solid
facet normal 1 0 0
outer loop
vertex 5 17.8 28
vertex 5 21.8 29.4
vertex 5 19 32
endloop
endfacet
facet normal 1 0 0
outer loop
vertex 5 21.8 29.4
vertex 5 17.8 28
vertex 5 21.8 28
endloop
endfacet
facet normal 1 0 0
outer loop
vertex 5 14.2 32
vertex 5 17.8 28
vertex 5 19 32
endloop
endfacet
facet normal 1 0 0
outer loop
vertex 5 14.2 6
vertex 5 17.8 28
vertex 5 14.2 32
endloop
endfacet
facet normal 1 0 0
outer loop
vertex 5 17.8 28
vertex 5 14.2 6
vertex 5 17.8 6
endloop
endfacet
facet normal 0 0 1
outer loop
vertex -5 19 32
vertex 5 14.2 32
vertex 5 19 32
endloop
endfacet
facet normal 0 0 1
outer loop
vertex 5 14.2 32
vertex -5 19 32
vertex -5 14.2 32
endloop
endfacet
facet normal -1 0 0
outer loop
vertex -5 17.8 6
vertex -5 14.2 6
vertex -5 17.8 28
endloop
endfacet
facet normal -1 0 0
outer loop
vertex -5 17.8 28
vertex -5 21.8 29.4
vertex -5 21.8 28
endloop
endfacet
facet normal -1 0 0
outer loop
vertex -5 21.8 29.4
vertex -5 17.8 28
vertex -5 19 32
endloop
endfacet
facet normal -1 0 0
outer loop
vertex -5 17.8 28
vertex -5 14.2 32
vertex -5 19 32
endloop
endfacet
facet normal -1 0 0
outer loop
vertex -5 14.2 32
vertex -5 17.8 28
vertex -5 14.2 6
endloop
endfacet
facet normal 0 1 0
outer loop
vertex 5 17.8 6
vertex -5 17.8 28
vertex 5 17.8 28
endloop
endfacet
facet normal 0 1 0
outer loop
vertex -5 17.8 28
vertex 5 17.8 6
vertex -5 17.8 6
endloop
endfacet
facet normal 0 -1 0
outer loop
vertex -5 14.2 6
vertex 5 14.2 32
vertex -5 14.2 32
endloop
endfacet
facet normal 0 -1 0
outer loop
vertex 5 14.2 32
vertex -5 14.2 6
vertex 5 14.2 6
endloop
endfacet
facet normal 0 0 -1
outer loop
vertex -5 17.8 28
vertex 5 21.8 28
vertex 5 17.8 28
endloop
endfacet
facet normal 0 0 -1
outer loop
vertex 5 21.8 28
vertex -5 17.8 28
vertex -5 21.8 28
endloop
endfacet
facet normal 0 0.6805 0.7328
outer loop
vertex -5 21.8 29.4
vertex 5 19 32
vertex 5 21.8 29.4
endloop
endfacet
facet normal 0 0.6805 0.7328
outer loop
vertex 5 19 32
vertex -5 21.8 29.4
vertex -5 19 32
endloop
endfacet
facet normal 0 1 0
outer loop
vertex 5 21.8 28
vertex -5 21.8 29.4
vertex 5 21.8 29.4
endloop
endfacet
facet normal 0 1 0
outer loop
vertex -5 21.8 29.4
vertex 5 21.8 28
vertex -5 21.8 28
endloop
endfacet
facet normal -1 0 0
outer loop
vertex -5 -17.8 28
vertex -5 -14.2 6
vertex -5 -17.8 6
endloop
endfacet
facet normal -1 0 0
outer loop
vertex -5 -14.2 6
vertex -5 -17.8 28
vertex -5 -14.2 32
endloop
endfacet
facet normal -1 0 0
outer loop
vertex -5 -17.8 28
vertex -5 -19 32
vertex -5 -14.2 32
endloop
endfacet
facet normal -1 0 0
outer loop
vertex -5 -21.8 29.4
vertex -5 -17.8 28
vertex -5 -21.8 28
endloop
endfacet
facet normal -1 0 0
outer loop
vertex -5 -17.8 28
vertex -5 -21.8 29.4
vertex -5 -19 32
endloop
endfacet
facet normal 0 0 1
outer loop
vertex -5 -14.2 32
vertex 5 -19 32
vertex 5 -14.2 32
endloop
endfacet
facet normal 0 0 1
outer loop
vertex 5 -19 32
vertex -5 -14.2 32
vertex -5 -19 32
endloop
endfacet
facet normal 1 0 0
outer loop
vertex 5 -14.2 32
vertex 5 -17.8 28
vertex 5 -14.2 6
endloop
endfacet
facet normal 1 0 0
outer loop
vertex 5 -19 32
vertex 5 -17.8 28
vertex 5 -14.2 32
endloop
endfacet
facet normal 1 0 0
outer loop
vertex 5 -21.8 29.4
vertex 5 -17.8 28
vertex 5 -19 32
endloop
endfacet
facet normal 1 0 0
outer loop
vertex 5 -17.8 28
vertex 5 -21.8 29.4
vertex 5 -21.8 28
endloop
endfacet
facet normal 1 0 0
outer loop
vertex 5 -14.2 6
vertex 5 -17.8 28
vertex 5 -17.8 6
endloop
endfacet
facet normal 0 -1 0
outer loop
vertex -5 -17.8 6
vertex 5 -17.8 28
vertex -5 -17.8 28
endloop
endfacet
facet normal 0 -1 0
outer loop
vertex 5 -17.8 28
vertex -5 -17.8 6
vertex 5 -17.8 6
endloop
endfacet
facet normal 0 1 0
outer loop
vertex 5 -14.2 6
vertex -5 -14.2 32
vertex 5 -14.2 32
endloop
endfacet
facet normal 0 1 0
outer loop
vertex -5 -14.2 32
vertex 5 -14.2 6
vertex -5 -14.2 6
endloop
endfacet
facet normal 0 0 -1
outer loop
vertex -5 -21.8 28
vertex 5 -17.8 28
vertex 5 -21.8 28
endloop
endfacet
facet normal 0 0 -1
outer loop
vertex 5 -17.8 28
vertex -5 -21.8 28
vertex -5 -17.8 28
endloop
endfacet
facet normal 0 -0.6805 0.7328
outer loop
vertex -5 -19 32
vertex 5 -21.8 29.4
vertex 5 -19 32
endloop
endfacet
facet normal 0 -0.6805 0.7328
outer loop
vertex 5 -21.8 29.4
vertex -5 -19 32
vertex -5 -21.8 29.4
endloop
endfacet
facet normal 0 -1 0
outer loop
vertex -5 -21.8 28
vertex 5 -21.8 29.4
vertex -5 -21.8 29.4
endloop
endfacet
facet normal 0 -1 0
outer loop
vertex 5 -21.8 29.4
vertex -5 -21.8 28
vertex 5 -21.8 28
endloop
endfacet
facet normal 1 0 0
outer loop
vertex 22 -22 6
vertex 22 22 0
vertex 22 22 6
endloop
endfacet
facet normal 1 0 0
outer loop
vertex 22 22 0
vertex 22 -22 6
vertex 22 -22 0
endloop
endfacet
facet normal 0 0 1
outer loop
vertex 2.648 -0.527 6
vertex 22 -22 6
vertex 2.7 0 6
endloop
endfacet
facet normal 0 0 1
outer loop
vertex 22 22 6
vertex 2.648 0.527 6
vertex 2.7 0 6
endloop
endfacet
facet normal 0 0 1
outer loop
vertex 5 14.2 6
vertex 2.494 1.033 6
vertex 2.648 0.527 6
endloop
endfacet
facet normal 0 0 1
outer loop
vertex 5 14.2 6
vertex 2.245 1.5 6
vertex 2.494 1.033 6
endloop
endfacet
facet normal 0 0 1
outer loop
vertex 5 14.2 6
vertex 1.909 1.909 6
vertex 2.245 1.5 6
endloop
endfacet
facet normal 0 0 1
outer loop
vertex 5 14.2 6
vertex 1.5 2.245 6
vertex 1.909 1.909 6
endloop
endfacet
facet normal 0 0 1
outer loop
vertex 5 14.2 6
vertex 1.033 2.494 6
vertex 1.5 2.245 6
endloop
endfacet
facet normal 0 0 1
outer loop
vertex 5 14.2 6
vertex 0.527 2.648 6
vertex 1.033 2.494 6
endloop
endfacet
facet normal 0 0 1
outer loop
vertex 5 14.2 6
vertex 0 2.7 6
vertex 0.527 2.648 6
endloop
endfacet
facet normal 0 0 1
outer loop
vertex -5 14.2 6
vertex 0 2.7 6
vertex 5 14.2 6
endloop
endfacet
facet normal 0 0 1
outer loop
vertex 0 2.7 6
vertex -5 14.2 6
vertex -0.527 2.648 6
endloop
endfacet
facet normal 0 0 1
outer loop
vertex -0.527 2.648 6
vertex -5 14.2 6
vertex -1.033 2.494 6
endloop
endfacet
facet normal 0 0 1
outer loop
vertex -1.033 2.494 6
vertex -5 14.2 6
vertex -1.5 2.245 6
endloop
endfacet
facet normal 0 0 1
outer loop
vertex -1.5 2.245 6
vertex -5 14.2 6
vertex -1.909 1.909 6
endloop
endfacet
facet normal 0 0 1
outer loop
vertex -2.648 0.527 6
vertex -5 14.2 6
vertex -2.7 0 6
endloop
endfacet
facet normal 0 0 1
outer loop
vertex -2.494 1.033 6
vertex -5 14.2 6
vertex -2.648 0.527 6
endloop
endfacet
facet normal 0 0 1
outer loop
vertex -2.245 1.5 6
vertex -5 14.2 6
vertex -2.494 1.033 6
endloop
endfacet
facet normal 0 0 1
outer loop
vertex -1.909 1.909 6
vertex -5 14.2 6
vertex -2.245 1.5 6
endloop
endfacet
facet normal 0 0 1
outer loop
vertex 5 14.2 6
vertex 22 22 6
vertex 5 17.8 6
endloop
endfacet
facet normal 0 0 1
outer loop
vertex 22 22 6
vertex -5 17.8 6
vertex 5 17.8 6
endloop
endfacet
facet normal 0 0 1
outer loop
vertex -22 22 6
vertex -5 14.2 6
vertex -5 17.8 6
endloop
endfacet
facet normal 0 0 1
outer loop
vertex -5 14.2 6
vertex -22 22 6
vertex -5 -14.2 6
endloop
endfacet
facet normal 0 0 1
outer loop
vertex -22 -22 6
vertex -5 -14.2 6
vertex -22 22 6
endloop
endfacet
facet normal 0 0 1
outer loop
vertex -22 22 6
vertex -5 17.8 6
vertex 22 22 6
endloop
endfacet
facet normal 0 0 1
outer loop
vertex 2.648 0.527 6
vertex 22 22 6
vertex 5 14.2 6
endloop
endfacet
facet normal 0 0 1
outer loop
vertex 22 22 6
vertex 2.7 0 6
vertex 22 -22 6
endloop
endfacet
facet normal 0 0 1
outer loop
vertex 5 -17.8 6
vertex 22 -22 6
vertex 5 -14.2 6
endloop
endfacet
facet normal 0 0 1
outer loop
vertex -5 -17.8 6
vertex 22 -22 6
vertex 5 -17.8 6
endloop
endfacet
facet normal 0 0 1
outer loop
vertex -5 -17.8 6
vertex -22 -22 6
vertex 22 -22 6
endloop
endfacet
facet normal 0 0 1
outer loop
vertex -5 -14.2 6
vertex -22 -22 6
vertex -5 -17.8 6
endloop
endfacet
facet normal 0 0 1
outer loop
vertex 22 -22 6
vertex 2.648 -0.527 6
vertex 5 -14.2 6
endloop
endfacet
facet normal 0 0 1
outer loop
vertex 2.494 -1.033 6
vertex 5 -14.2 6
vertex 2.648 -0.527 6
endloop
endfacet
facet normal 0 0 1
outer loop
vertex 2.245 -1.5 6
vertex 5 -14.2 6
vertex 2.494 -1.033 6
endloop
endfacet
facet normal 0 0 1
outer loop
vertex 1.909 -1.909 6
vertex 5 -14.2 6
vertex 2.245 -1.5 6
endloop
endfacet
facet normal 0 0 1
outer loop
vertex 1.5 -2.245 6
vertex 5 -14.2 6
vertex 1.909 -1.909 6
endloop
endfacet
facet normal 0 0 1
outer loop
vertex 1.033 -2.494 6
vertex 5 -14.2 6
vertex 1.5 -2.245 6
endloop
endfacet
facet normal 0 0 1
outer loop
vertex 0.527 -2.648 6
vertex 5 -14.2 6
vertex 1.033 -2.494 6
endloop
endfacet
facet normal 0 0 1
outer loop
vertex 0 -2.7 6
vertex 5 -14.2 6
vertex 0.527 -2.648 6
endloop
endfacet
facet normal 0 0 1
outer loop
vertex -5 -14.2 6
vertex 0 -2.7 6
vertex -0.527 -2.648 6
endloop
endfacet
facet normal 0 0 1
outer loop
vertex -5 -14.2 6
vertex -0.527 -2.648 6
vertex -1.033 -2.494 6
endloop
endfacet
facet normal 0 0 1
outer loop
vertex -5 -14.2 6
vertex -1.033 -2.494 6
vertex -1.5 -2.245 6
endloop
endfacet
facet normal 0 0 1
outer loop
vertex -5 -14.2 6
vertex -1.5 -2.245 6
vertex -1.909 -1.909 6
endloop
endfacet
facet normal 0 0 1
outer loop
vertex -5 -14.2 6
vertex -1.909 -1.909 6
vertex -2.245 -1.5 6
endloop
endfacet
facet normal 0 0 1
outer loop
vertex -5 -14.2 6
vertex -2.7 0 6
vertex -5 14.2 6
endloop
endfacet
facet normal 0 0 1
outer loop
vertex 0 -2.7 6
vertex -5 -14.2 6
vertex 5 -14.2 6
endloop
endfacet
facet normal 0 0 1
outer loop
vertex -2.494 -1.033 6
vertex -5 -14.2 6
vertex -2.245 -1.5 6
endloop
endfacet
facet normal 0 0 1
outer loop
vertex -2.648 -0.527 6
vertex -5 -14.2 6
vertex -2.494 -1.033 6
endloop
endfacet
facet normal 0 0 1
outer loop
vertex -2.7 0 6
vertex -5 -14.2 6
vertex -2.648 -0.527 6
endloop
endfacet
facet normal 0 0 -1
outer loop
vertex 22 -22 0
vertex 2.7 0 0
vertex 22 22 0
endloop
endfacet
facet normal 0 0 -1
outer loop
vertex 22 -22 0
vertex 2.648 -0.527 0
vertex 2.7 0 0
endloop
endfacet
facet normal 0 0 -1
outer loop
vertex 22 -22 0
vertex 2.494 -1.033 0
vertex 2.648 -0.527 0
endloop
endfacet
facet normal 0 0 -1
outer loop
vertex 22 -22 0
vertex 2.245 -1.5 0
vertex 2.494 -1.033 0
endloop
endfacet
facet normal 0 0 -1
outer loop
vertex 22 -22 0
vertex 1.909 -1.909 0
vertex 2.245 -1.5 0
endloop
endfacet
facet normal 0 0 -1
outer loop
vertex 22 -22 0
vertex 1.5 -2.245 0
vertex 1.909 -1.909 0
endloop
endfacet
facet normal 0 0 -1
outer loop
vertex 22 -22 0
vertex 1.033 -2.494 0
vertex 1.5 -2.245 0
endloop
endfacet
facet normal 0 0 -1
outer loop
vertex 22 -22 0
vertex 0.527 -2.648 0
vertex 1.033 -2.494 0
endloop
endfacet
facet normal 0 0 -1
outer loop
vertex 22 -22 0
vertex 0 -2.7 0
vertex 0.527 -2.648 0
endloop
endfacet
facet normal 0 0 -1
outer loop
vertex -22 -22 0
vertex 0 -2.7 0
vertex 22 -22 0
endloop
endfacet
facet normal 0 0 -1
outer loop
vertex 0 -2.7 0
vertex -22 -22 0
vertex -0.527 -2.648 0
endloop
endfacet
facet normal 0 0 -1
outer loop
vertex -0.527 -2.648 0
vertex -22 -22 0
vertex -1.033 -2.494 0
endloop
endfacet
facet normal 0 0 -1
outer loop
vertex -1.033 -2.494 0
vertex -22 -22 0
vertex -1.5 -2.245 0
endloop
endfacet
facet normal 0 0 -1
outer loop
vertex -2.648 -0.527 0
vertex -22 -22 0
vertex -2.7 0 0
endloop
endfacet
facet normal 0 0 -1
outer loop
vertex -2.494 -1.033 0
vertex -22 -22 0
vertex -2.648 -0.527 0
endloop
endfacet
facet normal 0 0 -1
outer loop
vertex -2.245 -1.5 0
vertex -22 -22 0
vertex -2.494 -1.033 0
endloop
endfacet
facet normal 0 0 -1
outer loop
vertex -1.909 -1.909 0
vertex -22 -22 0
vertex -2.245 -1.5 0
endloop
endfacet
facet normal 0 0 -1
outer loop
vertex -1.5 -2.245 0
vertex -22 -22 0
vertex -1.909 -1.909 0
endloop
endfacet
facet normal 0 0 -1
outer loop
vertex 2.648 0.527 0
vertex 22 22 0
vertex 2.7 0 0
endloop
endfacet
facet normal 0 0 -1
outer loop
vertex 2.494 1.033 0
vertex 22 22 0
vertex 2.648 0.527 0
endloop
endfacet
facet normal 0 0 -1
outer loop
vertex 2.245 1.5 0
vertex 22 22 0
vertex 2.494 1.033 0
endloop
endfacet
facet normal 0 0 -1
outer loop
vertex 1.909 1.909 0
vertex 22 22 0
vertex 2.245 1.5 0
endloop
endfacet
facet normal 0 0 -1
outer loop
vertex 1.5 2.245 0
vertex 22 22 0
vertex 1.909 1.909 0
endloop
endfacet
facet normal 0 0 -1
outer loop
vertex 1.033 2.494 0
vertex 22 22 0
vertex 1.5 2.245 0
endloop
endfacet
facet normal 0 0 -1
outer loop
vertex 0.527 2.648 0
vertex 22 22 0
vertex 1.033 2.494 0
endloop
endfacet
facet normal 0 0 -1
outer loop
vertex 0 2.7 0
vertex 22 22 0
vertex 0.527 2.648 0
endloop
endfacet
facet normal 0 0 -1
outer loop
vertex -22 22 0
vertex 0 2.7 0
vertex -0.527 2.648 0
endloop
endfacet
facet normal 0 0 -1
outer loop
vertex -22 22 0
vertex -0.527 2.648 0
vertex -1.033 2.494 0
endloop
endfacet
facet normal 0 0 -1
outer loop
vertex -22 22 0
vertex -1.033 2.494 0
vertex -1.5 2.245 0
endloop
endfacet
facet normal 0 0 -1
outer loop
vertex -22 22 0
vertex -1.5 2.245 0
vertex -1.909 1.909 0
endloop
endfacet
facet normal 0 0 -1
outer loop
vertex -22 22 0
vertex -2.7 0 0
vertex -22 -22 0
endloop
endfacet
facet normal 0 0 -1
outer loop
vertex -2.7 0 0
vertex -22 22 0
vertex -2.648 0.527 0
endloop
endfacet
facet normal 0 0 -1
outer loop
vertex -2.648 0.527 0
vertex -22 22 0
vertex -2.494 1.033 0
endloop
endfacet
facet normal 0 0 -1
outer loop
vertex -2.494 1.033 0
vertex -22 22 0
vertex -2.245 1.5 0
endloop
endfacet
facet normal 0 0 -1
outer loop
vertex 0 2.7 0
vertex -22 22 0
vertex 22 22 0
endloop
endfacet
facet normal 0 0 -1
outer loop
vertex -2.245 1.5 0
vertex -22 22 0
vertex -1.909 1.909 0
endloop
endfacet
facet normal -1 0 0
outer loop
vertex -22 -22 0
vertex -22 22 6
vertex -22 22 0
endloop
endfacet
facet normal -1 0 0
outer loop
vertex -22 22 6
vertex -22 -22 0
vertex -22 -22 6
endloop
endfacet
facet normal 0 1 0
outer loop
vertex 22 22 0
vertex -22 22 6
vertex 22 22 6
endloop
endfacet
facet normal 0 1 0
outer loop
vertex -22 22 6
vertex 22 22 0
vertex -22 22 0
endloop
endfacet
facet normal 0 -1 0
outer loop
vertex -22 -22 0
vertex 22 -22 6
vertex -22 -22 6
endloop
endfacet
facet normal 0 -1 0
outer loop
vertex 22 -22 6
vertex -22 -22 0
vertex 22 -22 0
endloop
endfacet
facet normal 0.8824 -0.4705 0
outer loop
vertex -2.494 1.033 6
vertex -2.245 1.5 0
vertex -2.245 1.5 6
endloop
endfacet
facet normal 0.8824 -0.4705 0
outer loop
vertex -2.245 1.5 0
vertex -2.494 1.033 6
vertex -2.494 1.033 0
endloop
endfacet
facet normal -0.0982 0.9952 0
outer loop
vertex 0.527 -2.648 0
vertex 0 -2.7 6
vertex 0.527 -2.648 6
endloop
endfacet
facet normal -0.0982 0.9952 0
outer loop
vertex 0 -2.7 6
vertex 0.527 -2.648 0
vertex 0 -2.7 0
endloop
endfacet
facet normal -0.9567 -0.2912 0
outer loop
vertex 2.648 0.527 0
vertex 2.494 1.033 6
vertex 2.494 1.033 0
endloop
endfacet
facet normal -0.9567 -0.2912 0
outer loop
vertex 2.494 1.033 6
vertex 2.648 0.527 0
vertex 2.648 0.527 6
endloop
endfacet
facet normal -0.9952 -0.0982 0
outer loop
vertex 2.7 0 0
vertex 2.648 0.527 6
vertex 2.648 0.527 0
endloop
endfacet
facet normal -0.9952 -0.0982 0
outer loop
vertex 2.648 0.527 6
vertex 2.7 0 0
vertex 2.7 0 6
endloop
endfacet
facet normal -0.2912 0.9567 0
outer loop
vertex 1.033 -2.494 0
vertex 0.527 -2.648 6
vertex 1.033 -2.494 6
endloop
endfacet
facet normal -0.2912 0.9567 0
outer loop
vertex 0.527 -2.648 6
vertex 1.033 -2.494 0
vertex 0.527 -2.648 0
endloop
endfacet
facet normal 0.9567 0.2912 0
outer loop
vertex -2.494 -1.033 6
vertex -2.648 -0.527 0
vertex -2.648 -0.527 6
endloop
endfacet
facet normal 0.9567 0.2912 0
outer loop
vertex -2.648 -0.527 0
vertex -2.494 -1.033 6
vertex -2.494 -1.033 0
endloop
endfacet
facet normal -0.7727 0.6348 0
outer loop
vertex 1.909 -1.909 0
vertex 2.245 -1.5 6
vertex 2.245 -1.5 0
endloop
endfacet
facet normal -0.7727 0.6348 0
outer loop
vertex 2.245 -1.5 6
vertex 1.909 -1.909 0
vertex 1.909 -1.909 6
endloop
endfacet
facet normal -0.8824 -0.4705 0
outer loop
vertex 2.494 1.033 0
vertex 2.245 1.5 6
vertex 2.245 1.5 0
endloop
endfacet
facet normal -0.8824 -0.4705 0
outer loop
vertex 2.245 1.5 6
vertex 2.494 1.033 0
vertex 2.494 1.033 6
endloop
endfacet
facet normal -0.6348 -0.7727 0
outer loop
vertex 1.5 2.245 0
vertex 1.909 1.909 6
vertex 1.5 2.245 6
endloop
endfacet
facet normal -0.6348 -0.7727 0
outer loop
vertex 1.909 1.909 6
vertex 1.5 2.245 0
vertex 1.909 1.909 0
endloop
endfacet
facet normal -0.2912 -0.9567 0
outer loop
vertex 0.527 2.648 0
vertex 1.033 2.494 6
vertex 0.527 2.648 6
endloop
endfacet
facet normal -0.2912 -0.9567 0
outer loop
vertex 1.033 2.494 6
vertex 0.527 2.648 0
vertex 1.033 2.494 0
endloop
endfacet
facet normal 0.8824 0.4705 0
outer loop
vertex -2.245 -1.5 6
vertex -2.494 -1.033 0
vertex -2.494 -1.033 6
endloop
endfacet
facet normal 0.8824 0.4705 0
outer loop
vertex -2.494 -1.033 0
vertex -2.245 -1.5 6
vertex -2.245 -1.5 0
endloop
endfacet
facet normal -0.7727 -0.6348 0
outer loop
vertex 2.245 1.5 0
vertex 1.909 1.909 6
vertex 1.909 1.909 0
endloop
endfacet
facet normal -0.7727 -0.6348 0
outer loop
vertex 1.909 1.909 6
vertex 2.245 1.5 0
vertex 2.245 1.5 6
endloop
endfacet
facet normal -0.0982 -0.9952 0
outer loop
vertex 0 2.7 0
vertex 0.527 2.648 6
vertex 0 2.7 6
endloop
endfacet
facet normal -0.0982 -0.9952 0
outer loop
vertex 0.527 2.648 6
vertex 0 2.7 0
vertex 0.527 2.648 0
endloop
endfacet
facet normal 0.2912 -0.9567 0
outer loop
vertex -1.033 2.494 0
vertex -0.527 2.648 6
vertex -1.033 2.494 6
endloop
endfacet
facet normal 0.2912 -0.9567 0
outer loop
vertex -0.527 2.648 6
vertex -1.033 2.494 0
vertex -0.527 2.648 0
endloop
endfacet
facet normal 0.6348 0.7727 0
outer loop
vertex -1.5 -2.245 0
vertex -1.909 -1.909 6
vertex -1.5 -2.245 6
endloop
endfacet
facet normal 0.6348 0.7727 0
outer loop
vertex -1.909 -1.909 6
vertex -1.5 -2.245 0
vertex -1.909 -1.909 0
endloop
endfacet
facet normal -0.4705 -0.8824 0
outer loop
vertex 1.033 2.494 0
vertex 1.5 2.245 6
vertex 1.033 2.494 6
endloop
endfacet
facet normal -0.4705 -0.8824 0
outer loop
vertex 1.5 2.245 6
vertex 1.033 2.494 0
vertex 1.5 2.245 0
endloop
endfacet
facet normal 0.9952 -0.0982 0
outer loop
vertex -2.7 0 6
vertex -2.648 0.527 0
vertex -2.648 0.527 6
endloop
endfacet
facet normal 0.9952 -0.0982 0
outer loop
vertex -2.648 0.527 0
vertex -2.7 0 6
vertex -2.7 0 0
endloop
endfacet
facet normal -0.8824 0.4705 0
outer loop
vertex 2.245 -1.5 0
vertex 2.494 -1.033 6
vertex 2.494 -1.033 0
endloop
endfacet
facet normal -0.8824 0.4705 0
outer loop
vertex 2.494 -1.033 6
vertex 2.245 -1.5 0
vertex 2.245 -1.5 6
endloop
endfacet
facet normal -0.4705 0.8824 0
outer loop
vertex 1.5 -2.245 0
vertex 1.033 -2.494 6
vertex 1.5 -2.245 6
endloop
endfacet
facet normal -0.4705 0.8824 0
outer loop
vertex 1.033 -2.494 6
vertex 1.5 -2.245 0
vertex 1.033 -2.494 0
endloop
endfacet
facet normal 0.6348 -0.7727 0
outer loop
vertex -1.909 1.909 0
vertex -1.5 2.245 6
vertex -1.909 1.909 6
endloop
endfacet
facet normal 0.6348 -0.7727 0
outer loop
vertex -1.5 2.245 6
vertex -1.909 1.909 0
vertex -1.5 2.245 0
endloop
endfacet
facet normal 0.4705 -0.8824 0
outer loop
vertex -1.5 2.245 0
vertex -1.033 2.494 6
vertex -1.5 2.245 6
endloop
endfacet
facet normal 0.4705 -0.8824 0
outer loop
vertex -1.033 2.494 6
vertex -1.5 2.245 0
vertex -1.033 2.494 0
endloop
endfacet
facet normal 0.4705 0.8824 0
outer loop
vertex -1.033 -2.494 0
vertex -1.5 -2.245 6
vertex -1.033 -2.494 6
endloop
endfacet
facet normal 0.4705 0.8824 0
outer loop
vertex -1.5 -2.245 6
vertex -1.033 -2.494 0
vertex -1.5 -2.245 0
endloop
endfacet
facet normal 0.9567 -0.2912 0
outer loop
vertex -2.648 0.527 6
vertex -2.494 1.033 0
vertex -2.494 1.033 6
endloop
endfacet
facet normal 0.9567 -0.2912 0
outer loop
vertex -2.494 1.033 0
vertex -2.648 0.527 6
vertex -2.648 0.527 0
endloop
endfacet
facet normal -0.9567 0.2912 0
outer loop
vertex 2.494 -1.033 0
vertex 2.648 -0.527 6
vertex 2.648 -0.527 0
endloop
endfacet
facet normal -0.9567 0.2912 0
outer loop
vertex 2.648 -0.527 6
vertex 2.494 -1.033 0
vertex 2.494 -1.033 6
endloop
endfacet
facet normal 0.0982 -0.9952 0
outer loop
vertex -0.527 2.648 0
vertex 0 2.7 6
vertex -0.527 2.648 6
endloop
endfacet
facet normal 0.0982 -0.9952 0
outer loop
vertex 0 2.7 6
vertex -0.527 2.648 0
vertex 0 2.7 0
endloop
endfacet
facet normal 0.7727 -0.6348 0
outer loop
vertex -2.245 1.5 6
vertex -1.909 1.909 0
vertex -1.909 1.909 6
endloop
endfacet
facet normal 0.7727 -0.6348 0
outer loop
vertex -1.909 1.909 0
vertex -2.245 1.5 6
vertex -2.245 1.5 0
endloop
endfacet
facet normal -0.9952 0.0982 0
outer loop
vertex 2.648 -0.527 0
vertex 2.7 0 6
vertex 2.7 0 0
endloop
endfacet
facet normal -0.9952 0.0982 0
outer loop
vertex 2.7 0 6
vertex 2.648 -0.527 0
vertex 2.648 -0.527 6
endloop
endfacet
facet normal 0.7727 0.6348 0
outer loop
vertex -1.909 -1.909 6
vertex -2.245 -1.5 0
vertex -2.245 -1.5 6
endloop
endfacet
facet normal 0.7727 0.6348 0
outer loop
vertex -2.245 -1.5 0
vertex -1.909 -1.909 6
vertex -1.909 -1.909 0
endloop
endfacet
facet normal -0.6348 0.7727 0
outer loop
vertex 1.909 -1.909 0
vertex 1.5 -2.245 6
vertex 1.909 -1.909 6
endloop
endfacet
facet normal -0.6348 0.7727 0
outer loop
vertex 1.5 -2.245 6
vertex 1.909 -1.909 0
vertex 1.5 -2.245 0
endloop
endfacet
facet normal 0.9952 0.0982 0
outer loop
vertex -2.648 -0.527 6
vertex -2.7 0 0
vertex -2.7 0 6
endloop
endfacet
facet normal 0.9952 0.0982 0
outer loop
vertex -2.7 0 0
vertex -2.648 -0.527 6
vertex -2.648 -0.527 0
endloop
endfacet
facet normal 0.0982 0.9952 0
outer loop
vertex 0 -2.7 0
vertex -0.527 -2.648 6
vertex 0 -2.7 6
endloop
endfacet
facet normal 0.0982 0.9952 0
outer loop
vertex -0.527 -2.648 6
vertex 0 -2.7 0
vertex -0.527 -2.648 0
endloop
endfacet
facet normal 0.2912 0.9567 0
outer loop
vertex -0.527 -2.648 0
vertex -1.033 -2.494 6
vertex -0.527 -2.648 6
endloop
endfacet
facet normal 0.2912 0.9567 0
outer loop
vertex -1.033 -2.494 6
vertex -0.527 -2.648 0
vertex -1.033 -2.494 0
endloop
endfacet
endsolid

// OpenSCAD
$fn = 32;

// ----------------------------------------------------------------------
// Snap-fit latch: 2 arms, 26 mm tall, 4.2 mm undercut hooks
// ----------------------------------------------------------------------

// --- parameters (mm) ---
base_d = 44;              // base plate depth
base_h = 6;               // base plate thickness
span = 32;                // distance between opposite arms
arm_t = 3.6;              // arm thickness
arm_d = 10;               // arm width
height = 26;              // free arm length
head_len = 4.2;           // hook reach
head_h = 4;               // hook height
lead = 1.4;               // lead-in ramp thickness
bore_d = 5.4;             // base fixing bore
top_z = 32;               // height of the arm tips above the base

arms = 2;

difference() {
  union() {
    /* base plate, centred on the arm ring */
    translate([-22, -22, 0]) cube([base_d, base_d, base_h]);
    for (a = [0 : 360 / arms : 359]) rotate([0, 0, a]) {
    /* arm, sunk 0.5 mm into the base */
    translate([-arm_d / 2, span / 2 - arm_t / 2, base_h - 0.5]) cube([arm_d, arm_t, height + 0.5]);
    /* hook: a convex hull of a tall inner block and a thin outer lip
       gives a flat undercut below and a lead-in ramp on top */
    hull() {
      translate([-arm_d / 2, span / 2 + arm_t / 2 - 0.6, top_z - head_h]) cube([arm_d, lead + 0.4, head_h]);
      translate([-arm_d / 2, span / 2 + arm_t / 2 - 0.2, top_z - head_h]) cube([arm_d, head_len, lead]);
    }
    }
  }
  translate([0, 0, -2.5]) cylinder(h = base_h + 5, d = bore_d);
}
